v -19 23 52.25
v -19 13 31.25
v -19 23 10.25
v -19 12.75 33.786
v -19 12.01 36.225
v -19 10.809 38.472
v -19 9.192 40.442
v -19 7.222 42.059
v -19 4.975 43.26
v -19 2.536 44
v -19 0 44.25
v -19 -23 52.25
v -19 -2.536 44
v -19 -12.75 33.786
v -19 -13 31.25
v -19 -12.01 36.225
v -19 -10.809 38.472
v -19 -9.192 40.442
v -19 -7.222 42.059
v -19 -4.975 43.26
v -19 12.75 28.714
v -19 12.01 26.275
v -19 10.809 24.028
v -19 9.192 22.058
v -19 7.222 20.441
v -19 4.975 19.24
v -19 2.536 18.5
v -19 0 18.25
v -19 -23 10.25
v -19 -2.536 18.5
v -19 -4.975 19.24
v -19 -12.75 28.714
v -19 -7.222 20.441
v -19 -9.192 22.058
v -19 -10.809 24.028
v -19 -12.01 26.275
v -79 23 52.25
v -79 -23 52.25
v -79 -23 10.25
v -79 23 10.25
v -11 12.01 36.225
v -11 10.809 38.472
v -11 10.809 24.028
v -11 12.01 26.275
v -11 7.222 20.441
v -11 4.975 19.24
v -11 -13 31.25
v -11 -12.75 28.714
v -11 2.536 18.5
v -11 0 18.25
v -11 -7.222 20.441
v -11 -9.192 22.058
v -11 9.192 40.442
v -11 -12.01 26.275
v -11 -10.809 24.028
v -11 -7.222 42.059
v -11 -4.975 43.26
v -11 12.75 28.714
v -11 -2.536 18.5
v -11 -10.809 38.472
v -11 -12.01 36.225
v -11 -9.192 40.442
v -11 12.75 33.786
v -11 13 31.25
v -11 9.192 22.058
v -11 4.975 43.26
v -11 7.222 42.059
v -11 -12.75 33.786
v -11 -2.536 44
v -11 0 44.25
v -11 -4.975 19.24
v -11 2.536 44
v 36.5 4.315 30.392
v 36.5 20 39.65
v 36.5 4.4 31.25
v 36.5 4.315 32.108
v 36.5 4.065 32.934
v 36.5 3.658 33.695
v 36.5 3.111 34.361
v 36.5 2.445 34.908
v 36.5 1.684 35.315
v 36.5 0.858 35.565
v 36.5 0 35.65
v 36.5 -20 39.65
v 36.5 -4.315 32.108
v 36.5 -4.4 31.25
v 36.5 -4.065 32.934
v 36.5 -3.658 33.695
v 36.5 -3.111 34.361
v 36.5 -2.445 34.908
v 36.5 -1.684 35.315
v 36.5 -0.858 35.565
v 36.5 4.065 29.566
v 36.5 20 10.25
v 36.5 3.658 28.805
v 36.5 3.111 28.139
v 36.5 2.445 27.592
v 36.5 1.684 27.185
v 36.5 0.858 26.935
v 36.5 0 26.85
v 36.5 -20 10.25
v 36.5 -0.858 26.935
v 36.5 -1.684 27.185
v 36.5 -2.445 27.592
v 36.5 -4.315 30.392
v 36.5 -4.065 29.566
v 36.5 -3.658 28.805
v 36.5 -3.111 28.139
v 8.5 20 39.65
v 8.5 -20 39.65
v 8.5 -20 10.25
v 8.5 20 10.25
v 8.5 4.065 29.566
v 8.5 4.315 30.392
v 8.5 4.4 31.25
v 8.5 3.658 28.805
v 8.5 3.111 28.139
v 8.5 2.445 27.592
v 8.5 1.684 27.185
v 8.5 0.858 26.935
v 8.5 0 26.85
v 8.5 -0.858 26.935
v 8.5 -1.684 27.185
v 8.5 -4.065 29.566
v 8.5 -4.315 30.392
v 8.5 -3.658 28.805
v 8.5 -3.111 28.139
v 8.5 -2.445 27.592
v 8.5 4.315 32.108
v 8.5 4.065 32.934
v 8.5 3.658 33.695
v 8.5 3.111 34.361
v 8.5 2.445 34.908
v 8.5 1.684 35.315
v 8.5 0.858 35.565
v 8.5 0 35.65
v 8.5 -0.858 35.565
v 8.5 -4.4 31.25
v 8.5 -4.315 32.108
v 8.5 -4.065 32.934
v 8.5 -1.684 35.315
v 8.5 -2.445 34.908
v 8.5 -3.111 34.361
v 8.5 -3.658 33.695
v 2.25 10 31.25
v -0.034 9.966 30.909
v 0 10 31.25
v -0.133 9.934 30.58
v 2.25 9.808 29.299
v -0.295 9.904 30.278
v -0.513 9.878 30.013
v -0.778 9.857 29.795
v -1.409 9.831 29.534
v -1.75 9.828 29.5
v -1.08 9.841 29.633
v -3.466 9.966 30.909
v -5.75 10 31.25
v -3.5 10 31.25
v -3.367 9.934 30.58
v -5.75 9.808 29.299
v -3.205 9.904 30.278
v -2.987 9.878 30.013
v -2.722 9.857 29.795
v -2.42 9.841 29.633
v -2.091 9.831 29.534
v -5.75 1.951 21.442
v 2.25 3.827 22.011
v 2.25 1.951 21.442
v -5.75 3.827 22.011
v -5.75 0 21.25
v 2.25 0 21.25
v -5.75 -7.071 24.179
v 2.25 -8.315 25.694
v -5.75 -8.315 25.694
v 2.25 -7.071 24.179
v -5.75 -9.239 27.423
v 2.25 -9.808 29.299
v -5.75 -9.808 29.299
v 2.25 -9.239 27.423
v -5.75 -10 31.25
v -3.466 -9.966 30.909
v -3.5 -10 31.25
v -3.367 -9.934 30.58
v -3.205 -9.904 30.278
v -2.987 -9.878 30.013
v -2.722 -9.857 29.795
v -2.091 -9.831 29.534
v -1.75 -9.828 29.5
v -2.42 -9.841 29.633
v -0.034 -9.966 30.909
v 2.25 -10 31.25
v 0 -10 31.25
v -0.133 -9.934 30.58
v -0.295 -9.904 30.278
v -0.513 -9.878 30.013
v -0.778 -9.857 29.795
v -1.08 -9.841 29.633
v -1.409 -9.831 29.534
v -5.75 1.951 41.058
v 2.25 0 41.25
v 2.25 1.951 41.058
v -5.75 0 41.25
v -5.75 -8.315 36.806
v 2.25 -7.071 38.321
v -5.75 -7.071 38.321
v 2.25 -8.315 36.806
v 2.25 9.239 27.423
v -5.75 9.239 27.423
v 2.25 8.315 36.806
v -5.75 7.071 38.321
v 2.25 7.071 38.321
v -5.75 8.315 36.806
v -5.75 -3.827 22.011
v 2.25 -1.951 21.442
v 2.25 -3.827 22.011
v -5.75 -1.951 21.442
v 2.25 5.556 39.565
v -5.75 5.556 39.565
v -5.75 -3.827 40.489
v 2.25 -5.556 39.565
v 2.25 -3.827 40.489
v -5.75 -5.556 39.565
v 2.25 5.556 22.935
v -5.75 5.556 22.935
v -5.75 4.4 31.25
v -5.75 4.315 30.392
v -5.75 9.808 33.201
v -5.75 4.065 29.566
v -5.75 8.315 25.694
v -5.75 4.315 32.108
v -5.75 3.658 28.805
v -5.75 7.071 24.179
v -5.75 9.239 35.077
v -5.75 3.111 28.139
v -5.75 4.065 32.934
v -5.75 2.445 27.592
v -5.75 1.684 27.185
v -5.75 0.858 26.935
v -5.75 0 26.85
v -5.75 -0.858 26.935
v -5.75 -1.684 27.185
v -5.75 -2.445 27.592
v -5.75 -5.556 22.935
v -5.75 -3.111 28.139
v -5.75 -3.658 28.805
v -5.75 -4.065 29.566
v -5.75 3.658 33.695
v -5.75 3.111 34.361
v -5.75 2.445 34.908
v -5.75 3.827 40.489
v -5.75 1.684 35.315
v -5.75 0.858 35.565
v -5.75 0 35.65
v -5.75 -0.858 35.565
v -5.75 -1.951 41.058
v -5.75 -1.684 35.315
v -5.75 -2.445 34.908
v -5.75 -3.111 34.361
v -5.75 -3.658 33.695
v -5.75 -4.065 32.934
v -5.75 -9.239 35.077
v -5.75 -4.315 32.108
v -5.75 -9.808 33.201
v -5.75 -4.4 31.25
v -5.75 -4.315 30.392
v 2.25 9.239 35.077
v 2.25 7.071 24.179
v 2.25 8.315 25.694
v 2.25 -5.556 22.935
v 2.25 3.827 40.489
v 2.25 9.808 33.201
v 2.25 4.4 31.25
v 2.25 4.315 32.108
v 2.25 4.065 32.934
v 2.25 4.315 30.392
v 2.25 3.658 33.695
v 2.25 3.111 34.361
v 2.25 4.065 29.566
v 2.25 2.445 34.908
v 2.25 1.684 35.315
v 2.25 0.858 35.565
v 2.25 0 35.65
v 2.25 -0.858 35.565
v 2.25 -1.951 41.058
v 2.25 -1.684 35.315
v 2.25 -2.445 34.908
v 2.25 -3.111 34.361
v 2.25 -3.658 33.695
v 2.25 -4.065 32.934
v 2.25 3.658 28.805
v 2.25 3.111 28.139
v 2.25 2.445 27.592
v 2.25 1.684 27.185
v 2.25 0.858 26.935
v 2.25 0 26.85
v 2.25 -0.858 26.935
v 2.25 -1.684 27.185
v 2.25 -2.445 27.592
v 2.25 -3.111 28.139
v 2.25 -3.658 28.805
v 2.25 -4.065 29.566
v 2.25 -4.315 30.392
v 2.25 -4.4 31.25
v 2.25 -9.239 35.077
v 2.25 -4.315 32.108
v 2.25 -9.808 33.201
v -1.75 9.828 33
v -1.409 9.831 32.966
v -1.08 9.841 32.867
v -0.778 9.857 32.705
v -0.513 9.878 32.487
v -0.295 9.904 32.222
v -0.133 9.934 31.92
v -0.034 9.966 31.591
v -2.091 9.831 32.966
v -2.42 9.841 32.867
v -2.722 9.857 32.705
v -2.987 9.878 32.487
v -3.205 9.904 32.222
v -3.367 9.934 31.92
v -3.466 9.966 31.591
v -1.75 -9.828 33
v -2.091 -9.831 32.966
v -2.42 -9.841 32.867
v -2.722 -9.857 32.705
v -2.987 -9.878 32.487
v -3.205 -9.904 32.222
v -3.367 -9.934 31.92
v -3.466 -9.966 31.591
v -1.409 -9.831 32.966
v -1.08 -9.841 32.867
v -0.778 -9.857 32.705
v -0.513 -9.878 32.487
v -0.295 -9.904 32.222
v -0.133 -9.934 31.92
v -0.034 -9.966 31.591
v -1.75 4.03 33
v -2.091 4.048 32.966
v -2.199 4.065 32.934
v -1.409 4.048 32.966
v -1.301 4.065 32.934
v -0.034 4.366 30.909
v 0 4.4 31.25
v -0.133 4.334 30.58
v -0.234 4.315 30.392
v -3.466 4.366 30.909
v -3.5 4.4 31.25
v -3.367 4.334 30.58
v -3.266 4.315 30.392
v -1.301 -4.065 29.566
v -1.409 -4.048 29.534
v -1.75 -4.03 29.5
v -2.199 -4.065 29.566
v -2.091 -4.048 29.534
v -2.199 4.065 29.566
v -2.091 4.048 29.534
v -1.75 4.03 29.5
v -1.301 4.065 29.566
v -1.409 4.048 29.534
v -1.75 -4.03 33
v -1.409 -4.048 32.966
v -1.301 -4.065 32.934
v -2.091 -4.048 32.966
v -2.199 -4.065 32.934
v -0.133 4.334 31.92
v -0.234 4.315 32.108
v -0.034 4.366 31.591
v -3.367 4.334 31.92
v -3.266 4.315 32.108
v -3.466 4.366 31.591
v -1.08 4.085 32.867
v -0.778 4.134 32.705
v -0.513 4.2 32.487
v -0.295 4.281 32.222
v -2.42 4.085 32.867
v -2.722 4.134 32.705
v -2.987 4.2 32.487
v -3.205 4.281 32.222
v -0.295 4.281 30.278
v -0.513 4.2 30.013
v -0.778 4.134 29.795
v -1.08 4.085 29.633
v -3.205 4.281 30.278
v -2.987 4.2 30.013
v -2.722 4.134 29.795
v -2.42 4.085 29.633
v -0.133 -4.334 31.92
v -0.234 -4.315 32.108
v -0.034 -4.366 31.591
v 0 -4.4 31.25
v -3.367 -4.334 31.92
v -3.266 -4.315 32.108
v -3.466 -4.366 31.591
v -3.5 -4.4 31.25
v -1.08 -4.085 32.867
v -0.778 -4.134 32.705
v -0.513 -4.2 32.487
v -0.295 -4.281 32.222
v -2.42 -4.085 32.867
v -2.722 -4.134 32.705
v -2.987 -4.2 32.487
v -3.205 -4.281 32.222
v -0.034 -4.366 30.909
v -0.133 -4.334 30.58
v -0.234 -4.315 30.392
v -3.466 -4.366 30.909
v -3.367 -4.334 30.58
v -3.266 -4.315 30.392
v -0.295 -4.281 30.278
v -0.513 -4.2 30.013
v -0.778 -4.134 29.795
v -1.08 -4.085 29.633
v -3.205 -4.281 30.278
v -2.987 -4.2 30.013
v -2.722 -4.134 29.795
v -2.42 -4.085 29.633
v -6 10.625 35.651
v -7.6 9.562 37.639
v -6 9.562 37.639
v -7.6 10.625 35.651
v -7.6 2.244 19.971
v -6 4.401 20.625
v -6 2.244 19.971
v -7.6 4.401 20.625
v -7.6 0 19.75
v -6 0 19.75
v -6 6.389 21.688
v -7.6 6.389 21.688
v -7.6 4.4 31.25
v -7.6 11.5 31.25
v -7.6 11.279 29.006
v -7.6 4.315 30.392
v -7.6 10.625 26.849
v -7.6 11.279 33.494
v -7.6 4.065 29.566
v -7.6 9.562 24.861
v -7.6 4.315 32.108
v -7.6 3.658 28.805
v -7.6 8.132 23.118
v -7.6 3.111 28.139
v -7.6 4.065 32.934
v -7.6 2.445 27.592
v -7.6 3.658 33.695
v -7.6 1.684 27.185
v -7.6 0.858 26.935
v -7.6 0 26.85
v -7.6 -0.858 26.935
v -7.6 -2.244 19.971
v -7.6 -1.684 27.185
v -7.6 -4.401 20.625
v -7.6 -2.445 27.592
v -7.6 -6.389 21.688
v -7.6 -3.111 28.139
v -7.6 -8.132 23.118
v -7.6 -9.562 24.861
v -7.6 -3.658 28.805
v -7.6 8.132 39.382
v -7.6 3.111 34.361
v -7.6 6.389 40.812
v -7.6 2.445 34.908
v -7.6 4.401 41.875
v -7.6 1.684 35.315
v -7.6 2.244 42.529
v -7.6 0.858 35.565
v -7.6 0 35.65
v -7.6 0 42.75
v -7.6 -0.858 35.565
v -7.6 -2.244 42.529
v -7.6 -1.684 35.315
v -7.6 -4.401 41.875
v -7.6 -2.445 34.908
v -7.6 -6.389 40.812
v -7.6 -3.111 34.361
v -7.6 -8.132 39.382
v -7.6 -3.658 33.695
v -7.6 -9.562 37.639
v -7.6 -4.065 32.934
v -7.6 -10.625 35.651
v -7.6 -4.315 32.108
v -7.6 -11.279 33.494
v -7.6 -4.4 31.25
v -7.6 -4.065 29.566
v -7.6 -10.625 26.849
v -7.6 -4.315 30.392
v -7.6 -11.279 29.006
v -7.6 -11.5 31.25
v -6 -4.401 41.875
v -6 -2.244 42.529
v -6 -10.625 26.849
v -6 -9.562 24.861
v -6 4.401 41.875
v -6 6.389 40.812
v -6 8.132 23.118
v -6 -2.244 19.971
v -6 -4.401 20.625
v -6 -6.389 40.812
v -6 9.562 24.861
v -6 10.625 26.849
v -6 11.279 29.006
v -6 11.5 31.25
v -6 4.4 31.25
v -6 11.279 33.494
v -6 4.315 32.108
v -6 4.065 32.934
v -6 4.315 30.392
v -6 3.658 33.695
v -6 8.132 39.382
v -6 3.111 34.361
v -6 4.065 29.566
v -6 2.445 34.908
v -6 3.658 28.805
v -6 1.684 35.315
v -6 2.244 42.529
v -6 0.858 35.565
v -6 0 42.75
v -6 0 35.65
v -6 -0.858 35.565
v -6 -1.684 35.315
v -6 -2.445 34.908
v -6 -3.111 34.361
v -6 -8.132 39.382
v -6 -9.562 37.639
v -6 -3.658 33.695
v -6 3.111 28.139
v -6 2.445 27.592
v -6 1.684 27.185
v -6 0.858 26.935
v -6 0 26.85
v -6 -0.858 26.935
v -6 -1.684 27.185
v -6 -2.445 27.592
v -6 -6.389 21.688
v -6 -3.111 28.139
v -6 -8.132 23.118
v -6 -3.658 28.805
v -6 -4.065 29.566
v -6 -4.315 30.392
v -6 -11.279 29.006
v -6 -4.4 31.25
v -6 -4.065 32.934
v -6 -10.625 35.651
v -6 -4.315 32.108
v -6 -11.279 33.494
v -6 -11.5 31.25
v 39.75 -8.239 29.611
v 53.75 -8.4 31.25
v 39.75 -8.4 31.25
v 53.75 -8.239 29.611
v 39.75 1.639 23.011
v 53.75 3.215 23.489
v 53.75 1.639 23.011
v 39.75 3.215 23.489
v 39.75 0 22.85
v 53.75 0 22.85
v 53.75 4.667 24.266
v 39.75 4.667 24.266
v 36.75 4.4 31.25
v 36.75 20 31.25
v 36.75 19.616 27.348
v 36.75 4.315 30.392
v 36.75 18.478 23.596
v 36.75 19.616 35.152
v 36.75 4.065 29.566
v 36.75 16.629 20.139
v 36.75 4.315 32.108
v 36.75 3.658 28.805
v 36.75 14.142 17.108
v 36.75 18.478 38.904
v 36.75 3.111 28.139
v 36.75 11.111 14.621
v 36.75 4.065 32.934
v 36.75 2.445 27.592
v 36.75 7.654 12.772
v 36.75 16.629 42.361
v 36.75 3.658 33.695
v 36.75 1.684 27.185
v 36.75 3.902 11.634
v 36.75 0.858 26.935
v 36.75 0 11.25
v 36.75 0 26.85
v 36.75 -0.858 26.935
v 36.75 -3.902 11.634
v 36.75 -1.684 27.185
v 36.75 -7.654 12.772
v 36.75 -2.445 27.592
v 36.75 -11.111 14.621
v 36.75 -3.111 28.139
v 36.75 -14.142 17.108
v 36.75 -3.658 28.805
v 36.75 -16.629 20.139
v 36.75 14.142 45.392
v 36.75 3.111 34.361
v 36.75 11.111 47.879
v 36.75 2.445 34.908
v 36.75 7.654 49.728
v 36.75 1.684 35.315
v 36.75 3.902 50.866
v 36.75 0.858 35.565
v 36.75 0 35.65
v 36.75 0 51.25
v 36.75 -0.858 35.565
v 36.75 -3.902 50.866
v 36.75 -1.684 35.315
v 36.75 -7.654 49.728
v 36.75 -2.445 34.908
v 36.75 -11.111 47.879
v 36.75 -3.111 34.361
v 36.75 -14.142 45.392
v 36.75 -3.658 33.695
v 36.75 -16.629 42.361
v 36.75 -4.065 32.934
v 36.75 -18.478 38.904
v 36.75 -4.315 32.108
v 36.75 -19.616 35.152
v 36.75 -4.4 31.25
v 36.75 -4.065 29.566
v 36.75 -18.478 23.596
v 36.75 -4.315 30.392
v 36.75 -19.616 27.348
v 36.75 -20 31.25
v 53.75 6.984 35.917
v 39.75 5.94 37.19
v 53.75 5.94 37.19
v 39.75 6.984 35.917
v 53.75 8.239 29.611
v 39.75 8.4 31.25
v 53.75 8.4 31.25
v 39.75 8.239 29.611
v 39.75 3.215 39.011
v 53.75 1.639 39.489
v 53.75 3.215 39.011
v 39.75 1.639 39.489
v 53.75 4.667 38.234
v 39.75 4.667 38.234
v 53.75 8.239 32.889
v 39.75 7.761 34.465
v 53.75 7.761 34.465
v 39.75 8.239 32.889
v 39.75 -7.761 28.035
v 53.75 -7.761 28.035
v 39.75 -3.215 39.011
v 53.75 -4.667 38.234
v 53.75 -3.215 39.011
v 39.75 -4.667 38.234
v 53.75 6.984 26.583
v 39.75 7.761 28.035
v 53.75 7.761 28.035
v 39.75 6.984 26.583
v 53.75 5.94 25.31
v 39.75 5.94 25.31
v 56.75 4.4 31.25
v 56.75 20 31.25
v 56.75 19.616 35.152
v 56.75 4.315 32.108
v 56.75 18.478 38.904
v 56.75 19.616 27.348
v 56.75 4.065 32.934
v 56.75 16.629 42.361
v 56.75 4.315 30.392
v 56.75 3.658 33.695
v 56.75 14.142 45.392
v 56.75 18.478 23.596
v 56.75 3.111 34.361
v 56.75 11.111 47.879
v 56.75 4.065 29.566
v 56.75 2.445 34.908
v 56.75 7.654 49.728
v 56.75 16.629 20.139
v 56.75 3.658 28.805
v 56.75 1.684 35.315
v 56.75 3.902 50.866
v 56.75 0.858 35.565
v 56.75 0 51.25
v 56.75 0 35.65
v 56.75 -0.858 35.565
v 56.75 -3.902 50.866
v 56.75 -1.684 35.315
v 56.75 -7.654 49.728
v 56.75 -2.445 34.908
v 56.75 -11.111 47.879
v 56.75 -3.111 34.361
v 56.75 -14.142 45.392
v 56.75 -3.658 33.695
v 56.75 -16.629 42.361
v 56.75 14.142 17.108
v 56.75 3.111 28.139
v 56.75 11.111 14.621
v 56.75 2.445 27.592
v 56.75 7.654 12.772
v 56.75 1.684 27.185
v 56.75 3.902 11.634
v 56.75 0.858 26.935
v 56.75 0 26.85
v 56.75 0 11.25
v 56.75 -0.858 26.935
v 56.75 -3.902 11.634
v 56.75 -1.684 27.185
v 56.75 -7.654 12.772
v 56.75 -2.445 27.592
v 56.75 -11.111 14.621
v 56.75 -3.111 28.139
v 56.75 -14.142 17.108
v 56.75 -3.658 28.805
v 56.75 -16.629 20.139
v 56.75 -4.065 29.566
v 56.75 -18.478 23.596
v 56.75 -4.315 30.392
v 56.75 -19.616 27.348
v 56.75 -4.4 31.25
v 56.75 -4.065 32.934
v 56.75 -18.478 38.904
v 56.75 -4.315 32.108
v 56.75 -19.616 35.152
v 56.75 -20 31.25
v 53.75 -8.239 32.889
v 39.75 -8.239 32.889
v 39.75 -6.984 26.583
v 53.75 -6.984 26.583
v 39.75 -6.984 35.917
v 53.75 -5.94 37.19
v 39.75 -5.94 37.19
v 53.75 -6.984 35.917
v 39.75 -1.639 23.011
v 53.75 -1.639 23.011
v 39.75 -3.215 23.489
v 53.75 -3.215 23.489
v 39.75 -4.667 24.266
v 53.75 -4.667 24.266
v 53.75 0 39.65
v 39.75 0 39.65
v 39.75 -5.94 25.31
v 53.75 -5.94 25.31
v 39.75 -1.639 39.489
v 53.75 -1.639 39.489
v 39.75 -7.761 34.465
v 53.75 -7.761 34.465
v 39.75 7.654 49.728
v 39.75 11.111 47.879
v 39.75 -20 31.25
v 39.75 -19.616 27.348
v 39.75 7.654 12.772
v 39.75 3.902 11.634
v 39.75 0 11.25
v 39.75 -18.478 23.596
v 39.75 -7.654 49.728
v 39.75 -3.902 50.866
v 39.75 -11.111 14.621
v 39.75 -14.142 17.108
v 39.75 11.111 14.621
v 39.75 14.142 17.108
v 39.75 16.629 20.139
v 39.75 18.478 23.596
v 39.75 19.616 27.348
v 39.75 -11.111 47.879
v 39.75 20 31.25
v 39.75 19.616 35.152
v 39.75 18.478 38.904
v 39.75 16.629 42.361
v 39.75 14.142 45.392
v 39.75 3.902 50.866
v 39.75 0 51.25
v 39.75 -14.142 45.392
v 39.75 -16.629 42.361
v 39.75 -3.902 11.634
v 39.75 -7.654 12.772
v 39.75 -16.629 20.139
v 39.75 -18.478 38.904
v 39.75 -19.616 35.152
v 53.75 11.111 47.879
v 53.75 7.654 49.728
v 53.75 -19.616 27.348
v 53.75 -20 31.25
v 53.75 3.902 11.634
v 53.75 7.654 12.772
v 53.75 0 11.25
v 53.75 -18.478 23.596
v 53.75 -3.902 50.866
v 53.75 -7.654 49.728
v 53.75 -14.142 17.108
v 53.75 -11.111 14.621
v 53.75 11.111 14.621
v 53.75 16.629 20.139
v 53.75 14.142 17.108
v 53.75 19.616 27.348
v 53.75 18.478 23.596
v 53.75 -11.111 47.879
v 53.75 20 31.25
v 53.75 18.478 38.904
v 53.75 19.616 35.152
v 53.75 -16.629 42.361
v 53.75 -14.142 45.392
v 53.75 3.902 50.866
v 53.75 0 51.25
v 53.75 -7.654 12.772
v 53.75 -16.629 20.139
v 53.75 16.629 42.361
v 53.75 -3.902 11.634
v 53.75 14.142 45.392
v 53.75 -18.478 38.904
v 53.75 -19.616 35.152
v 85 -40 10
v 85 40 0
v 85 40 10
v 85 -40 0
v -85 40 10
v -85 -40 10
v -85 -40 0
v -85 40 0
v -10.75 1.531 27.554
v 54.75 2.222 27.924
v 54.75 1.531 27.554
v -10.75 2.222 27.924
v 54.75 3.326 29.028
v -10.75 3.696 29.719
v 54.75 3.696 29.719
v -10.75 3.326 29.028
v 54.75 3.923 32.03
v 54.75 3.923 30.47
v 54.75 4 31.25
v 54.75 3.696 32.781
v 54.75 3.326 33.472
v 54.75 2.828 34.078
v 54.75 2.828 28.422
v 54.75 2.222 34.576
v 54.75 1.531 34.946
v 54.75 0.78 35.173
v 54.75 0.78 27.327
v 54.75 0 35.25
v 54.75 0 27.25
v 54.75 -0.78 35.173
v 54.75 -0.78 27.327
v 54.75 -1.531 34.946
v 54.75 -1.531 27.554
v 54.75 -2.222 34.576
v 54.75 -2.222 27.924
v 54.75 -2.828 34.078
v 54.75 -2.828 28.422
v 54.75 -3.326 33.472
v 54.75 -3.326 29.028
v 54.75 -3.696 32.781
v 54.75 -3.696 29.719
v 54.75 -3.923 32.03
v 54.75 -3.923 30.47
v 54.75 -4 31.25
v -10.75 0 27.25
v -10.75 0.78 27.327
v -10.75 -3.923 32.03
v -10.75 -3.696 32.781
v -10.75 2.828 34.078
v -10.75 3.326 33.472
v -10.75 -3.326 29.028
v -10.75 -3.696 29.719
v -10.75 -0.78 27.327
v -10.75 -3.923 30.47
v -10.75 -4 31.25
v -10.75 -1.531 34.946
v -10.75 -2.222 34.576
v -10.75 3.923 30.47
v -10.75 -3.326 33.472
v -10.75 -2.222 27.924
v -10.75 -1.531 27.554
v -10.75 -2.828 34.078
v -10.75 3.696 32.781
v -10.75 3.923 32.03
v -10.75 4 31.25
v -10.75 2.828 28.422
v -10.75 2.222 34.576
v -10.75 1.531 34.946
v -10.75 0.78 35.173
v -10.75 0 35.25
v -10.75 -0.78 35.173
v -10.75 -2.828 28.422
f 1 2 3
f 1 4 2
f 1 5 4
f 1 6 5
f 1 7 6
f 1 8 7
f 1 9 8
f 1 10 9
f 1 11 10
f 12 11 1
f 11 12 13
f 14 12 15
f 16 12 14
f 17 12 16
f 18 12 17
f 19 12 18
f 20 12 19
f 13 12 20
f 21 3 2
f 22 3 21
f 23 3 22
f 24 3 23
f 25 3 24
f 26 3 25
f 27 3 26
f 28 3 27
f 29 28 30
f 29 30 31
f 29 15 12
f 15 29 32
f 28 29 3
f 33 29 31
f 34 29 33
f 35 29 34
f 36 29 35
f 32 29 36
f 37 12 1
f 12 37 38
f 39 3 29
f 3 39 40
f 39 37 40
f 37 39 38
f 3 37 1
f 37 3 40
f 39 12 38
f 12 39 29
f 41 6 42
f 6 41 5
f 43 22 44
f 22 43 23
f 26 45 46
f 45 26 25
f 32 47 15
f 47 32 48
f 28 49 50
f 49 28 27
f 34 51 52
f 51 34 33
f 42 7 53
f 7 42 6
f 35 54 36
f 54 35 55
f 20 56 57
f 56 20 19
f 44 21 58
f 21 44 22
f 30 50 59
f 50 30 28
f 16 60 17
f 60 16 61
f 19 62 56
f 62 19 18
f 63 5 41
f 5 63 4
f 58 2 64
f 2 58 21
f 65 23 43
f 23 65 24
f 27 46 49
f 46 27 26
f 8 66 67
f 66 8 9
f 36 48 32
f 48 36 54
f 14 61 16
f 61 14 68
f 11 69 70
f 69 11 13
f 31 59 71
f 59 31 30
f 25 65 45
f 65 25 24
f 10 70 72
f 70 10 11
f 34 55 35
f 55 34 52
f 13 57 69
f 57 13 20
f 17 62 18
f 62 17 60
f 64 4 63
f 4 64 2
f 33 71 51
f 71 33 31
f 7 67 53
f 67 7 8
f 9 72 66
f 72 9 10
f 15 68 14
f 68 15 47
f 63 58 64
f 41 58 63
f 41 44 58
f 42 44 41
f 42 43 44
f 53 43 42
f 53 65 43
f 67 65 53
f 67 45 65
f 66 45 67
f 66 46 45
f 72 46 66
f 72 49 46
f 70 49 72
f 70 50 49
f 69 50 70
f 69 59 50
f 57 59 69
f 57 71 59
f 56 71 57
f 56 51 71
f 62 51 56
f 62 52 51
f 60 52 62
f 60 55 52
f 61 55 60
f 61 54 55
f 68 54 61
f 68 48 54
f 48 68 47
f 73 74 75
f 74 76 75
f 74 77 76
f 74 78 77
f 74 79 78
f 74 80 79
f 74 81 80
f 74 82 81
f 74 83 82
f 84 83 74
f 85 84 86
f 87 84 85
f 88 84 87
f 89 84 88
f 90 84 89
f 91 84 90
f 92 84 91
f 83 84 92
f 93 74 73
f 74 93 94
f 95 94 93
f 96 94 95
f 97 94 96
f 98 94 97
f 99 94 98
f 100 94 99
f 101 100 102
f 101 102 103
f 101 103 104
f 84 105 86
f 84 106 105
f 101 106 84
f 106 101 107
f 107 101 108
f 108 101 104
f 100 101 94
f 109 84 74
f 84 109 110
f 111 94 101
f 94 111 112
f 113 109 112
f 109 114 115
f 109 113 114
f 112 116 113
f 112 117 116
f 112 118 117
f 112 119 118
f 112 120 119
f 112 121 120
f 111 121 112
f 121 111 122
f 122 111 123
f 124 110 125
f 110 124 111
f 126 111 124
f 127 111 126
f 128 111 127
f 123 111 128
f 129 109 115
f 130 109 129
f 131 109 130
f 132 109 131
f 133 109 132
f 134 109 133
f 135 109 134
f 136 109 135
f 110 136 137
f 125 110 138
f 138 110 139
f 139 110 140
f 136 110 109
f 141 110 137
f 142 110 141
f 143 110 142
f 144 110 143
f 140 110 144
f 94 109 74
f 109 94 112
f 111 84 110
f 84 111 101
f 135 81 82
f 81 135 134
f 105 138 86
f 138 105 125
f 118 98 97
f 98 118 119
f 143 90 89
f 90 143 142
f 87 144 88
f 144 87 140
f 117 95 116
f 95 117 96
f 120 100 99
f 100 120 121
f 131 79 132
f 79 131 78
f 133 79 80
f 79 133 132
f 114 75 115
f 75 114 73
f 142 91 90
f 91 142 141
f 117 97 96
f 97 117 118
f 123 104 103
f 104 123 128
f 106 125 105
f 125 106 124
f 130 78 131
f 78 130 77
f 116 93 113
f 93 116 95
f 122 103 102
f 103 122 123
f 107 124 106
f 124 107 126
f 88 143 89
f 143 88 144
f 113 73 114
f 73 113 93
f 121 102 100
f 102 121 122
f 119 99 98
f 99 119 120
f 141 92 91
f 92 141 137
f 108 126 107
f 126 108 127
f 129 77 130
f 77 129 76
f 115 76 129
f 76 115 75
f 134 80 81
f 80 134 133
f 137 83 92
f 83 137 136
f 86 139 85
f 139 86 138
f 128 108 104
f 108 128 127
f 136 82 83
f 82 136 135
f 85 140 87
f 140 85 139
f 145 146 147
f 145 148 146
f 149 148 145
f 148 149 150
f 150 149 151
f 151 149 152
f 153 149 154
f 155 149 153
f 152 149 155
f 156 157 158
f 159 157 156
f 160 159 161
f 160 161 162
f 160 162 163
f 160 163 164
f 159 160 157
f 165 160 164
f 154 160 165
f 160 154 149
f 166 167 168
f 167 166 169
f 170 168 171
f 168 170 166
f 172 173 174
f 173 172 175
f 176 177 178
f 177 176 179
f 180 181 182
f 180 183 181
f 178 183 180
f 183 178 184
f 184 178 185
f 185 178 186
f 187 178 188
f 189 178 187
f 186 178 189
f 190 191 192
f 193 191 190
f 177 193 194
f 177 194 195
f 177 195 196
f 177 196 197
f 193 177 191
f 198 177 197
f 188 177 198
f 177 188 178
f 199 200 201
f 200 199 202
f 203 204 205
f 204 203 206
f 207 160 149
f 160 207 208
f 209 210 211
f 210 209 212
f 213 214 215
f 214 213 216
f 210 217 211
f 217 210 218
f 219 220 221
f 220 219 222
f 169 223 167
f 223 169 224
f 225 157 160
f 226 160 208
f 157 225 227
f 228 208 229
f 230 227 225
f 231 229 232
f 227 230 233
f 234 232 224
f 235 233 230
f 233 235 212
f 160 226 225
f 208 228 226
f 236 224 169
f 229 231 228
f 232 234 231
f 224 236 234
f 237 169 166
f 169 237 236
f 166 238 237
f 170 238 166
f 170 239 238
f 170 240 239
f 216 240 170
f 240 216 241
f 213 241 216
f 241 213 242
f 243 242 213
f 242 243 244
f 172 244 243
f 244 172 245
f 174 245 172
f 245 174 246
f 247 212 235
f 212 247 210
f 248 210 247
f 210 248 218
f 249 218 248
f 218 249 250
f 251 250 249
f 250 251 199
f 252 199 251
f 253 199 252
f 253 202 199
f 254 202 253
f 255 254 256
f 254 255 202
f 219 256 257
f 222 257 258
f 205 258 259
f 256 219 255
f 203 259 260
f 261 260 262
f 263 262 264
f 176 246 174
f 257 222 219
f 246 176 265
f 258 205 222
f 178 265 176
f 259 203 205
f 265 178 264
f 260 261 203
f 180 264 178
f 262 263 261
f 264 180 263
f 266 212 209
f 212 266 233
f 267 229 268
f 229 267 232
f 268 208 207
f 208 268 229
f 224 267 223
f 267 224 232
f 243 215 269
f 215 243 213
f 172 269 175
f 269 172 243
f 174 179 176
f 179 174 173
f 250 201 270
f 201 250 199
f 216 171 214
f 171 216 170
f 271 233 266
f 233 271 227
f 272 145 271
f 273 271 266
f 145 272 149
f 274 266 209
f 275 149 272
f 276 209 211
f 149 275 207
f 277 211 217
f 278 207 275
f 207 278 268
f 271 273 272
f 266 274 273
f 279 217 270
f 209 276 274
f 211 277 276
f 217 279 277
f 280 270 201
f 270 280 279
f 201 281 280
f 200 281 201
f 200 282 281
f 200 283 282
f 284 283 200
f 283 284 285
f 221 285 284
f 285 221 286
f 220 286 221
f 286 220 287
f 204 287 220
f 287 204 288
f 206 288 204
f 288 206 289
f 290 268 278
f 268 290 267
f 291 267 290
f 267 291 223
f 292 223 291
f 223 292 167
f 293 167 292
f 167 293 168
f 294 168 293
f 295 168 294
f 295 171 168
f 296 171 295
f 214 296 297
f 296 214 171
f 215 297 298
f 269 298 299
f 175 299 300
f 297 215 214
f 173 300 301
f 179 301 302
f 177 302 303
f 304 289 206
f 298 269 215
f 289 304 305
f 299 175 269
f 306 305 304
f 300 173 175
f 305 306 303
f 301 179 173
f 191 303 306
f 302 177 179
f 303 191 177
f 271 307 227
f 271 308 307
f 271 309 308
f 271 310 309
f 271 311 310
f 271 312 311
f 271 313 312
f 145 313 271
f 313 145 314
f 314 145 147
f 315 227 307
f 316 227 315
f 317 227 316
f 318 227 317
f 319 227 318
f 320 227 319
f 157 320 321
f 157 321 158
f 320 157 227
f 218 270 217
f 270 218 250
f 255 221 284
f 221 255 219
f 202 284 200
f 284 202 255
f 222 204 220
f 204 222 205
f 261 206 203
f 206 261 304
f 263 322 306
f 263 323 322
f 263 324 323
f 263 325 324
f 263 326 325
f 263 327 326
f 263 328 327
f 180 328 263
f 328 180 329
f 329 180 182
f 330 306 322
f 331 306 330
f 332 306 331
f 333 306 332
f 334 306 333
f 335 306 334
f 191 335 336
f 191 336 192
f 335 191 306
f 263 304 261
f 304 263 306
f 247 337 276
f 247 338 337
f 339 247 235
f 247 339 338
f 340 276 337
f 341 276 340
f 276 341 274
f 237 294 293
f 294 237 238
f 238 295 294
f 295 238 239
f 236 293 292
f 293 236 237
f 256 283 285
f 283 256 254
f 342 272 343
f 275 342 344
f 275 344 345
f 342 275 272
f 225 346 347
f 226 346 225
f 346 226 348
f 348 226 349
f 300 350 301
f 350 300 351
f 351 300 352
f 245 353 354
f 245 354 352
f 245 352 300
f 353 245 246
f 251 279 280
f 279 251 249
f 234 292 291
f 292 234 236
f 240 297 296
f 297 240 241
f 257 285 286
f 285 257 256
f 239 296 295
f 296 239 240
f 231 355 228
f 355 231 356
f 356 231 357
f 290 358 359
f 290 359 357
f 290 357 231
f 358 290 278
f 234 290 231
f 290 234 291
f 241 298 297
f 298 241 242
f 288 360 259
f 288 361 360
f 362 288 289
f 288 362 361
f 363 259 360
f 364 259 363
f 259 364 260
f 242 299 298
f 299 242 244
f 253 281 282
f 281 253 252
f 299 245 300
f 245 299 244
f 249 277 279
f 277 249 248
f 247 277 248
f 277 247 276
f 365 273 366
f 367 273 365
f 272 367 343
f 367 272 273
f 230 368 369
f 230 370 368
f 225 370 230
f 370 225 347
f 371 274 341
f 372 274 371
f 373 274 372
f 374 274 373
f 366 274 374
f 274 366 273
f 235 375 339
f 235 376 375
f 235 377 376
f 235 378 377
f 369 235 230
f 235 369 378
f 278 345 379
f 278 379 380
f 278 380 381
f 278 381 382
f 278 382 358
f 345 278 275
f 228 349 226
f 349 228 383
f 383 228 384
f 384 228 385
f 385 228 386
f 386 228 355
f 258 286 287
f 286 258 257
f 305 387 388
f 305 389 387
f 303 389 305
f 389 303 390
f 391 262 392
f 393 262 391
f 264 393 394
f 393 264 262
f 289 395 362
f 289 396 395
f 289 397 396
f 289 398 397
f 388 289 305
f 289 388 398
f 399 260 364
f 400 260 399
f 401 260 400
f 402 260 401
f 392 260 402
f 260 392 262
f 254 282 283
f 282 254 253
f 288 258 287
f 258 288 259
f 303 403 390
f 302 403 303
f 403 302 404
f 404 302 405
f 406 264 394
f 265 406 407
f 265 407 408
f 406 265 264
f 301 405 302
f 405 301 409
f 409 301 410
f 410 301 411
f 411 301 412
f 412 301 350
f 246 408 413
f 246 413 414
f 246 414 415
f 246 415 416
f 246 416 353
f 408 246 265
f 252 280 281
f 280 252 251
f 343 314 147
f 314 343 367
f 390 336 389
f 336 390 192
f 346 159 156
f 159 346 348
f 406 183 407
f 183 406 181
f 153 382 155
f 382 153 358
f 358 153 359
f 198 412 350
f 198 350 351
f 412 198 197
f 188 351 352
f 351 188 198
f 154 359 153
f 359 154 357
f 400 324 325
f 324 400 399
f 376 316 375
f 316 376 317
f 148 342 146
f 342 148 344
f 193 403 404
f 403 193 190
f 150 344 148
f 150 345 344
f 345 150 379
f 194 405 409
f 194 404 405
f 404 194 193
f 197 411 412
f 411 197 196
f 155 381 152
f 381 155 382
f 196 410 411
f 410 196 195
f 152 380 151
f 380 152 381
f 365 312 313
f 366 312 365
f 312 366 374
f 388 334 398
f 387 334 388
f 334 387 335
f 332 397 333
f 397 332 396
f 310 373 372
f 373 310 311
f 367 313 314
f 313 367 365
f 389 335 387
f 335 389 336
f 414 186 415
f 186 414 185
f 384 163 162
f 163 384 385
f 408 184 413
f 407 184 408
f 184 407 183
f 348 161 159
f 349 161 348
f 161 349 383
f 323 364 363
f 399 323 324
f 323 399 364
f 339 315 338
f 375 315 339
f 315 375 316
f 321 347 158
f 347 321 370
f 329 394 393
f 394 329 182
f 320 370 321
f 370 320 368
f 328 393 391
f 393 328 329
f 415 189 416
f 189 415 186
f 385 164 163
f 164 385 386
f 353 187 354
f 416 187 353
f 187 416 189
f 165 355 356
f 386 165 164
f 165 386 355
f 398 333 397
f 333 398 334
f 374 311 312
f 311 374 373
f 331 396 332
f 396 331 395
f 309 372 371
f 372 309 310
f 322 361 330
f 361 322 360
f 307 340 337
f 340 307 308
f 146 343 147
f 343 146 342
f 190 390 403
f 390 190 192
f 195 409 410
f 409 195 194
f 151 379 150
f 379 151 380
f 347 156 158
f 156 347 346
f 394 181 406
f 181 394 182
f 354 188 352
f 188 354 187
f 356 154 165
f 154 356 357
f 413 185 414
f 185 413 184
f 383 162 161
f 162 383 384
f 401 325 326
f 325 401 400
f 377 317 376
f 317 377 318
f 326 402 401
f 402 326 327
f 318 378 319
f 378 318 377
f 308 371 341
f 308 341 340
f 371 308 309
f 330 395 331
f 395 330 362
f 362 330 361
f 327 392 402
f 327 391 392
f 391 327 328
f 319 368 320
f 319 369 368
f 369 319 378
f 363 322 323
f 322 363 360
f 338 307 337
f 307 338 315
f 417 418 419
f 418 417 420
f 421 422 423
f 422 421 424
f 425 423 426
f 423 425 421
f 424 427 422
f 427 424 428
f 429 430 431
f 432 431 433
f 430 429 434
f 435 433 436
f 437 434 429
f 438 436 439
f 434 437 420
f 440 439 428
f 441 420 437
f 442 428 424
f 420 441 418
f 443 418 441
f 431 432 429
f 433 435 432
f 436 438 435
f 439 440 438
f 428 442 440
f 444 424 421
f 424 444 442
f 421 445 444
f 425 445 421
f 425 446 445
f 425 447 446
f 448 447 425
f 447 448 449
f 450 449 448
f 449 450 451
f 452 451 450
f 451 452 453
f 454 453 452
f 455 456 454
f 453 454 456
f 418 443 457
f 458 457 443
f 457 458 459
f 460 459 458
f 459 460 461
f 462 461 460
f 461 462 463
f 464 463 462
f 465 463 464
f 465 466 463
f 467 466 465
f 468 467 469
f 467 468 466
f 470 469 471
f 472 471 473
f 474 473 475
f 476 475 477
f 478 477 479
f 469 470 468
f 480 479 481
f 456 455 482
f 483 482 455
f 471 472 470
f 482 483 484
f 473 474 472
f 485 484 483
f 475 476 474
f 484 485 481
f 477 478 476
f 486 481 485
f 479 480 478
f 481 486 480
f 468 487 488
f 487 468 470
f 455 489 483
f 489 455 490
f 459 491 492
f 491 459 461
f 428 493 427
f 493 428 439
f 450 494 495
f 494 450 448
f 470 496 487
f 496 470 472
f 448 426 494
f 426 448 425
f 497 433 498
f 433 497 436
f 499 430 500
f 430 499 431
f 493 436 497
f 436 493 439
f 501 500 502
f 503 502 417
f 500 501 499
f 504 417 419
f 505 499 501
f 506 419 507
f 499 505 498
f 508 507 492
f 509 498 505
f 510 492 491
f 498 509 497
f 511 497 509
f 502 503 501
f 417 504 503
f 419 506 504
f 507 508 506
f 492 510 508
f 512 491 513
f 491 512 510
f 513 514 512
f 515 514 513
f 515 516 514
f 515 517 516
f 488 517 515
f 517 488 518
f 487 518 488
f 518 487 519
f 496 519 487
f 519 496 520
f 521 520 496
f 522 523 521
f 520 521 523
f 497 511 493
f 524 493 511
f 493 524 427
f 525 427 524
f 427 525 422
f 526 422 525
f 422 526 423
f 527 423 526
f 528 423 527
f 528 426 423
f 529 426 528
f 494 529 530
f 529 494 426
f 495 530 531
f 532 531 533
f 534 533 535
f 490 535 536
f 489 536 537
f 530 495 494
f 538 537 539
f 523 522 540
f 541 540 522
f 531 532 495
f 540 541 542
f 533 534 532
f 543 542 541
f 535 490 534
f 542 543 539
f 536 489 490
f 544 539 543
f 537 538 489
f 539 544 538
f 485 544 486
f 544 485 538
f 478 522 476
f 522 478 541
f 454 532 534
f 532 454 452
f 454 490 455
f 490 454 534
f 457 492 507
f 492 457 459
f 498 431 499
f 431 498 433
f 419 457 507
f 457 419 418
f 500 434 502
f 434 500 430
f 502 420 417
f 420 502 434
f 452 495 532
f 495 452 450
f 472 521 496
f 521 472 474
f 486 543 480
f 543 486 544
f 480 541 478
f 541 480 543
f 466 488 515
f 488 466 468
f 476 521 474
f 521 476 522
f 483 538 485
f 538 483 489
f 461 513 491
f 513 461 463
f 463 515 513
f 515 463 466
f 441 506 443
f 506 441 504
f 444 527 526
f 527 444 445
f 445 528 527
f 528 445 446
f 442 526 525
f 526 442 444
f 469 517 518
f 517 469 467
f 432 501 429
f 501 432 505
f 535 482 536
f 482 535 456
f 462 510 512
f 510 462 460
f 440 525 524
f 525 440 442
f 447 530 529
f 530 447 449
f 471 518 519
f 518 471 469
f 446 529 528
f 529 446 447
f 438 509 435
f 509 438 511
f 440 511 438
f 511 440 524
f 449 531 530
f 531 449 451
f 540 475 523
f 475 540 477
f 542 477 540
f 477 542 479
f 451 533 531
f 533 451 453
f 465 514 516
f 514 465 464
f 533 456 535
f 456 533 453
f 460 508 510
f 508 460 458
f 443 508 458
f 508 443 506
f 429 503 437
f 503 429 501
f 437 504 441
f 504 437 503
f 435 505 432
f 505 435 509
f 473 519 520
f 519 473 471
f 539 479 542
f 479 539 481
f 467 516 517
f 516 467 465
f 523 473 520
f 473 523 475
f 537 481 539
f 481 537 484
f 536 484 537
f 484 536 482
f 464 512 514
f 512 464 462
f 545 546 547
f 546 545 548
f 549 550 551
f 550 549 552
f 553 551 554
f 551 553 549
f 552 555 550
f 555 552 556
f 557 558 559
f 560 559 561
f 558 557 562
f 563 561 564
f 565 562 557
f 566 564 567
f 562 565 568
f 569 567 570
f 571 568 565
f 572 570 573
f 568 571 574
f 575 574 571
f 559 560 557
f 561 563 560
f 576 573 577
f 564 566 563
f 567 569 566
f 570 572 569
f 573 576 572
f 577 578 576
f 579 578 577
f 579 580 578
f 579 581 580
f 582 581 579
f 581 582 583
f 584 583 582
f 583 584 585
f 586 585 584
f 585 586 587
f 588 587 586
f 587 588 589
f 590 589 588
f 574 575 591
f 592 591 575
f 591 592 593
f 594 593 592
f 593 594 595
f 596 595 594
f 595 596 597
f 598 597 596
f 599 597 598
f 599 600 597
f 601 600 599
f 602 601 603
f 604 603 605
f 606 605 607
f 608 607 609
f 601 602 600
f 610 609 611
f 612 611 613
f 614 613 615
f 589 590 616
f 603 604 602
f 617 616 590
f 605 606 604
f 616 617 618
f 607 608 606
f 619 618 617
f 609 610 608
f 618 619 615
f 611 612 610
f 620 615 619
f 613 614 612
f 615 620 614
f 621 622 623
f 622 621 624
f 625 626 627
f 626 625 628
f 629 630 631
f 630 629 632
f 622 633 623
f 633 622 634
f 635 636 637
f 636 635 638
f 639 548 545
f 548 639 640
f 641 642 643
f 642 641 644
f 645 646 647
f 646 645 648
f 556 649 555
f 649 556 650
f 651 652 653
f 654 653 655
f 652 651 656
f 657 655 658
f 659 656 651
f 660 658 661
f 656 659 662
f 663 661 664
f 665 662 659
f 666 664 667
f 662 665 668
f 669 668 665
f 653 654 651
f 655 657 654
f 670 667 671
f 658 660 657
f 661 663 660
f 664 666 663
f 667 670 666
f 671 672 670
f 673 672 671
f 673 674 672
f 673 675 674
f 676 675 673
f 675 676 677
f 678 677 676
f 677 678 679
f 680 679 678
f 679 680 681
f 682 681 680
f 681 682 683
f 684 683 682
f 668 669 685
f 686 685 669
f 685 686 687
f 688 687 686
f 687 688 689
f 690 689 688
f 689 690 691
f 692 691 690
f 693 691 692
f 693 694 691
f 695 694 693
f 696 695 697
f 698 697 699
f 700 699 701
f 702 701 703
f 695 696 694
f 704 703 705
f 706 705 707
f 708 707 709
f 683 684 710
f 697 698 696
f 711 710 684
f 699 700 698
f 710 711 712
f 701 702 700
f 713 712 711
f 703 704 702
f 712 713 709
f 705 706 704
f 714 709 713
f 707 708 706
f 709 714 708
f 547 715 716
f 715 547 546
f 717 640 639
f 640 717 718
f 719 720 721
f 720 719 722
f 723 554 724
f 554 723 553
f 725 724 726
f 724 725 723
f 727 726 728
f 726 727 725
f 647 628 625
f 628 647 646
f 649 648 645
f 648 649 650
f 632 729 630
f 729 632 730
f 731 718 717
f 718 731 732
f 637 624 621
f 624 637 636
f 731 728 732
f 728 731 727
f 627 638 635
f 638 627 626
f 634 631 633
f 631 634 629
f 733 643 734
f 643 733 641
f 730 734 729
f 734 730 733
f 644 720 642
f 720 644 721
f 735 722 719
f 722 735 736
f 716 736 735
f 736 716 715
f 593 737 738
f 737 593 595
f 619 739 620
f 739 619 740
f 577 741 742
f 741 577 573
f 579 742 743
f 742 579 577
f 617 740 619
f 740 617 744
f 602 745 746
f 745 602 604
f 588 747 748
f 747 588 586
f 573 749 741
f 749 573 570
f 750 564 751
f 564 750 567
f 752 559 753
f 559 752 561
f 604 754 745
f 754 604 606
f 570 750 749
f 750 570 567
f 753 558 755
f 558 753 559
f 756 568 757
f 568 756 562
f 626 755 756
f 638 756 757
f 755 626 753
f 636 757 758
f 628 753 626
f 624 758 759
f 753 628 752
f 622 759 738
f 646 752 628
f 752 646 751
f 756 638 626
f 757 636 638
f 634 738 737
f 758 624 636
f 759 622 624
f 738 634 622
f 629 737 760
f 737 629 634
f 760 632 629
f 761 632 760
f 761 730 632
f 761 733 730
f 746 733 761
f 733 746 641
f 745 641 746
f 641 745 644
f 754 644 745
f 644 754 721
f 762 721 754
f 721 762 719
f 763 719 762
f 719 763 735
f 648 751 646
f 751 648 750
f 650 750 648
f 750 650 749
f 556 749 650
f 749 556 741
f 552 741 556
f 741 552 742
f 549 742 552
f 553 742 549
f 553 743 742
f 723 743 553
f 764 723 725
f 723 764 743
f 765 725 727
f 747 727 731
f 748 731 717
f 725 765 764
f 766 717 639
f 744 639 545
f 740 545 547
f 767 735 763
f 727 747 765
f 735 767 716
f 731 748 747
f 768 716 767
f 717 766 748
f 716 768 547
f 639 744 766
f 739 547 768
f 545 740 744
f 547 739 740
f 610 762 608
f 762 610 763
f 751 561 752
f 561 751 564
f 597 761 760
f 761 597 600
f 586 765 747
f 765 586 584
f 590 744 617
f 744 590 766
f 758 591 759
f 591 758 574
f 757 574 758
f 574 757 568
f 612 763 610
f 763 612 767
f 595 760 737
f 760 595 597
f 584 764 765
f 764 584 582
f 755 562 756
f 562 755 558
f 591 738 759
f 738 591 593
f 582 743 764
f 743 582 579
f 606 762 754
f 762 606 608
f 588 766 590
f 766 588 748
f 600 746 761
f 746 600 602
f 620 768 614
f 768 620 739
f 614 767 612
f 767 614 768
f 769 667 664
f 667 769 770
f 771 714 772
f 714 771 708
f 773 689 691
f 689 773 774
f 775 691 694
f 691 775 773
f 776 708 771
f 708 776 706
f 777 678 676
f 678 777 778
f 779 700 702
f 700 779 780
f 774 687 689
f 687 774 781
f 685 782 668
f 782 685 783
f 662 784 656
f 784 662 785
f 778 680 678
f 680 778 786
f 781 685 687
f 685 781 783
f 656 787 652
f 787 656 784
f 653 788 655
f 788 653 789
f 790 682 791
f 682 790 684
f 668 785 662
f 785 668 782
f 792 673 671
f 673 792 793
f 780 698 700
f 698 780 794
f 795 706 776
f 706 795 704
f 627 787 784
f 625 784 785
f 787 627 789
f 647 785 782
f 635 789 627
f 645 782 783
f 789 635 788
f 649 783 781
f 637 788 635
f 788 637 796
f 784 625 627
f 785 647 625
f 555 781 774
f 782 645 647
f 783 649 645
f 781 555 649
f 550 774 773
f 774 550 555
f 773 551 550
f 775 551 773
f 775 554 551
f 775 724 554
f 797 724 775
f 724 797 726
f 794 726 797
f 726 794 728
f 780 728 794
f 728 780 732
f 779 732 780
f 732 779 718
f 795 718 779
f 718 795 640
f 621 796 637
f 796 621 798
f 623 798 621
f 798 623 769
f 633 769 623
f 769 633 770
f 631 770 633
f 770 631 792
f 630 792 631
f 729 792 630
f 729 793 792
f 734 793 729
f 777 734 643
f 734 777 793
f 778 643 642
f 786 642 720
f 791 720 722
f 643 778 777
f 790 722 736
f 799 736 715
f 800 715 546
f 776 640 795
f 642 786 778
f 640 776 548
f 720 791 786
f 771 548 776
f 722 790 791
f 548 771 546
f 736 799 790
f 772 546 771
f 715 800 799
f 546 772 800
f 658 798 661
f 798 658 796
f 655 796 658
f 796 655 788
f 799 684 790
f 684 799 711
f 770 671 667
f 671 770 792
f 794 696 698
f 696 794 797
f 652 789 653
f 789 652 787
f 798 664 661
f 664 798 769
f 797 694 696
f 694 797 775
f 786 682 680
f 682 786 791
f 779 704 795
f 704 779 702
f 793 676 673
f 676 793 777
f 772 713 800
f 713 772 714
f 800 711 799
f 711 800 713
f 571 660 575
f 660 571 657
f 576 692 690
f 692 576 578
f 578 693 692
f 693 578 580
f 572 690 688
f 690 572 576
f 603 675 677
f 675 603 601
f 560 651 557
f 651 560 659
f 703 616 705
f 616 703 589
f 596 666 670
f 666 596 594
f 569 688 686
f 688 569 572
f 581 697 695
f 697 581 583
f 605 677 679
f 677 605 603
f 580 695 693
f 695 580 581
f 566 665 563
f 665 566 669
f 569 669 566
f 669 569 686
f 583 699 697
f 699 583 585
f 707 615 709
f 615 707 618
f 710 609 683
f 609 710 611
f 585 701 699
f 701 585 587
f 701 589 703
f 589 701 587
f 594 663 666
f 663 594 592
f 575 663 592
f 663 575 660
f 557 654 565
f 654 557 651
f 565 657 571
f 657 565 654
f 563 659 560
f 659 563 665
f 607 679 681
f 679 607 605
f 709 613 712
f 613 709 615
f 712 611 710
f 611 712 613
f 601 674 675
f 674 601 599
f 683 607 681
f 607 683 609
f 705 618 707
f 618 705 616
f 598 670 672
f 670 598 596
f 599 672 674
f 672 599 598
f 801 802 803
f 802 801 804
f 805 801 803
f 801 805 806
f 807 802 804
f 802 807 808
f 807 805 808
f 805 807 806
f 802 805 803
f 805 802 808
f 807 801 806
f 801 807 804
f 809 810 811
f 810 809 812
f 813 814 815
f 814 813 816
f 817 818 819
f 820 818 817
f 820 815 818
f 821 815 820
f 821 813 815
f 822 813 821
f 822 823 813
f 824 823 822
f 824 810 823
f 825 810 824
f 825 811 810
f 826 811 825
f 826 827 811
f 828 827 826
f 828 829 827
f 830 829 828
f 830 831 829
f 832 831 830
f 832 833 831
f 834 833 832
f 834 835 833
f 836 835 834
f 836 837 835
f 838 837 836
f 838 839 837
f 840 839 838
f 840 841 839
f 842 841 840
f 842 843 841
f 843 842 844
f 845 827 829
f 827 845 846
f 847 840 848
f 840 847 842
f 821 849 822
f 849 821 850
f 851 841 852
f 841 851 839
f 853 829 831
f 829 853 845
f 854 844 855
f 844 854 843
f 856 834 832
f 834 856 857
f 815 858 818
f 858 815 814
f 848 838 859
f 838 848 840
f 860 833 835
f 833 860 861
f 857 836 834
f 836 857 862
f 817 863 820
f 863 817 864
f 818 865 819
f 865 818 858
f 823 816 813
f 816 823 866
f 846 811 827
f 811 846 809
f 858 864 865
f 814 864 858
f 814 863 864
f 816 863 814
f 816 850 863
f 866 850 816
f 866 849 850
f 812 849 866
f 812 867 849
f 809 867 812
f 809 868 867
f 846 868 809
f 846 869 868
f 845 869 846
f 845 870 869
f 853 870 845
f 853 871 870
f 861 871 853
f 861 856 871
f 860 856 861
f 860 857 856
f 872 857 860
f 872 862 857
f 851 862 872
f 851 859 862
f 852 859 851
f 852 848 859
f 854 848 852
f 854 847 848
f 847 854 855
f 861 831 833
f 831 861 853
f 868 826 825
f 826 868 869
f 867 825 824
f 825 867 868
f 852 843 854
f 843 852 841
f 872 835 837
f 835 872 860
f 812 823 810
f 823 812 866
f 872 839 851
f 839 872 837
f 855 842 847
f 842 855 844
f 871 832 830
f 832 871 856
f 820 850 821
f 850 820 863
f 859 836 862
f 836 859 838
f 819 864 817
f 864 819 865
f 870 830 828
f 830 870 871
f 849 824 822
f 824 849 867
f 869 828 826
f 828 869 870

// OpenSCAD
$fn = 32;

// ------------------------------------------------------------------------
// Motor drive station: motor 60 x 42 mm, shaft d8, pulley d40
// Every part is its own module, assembly() places every instance.
// ------------------------------------------------------------------------

// --- part 1 ---
module station_bed() {
  difference() {
    translate([-85, -40, 0]) cube([170, 80, 10]);
  }
}

// --- part 2 ---
module drive_motor() {
  union() {
    translate([-30, -23, 0]) cube([60, 46, 42]);
    translate([34, 0, 21]) rotate([0, 90, 0]) cylinder(h = 8, d = 26, center = true);
  }
}

// --- part 3 ---
module pillow_block() {
  difference() {
    translate([-14, -20, 0]) cube([28, 40, 29.4]);
    translate([0, 0, 21]) rotate([0, 90, 0]) cylinder(h = 30, d = 8.8, center = true);
  }
}

// --- part 4 ---
module drive_shaft() {
  translate([0, 0, -32.75]) cylinder(h = 65.5, d = 8);
}

// --- part 5 ---
module shaft_collar() {
  difference() {
    cylinder(h = 8, d = 20);
    translate([0, 0, -1]) cylinder(h = 10, d = 8.8);
    translate([0, 0, 4]) rotate([90, 0, 0]) cylinder(h = 22, d = 3.5, center = true);
  }
}

// --- part 6 ---
module collar_washer() {
  difference() {
      translate([0, 0, 0]) cylinder(h = 1.6, d = 23);
      translate([0, 0, -1]) cylinder(h = 3.6, d = 8.8);
    }
}

// --- part 7 ---
module drive_pulley() {
  difference() {
    union() {
      cylinder(h = 20, d = 16.8);
      cylinder(h = 3, d = 40);
      translate([0, 0, 17]) cylinder(h = 3, d = 40);
    }
    translate([0, 0, -1]) cylinder(h = 22, d = 8.8);
  }
}

// --- assembly ---
module assembly() {
  color([0.80, 0.24, 0.20]) translate([0, 0, 0]) rotate([0, 0, 0]) station_bed();
  color([0.20, 0.45, 0.75]) translate([-49, 0, 10.25]) rotate([0, 0, 0]) drive_motor();
  color([0.25, 0.62, 0.32]) translate([22.5, 0, 10.25]) rotate([0, 0, 0]) pillow_block();
  color([0.92, 0.70, 0.18]) translate([22, 0, 31.25]) rotate([0, 90, 0]) drive_shaft();
  color([0.58, 0.35, 0.70]) translate([-5.75, 0, 31.25]) rotate([0, 90, 0]) shaft_collar();
  color([0.16, 0.66, 0.66]) translate([-7.6, 0, 31.25]) rotate([0, 90, 0]) collar_washer();
  color([0.85, 0.48, 0.18]) translate([36.75, 0, 31.25]) rotate([0, 90, 0]) drive_pulley();
}

assembly();
